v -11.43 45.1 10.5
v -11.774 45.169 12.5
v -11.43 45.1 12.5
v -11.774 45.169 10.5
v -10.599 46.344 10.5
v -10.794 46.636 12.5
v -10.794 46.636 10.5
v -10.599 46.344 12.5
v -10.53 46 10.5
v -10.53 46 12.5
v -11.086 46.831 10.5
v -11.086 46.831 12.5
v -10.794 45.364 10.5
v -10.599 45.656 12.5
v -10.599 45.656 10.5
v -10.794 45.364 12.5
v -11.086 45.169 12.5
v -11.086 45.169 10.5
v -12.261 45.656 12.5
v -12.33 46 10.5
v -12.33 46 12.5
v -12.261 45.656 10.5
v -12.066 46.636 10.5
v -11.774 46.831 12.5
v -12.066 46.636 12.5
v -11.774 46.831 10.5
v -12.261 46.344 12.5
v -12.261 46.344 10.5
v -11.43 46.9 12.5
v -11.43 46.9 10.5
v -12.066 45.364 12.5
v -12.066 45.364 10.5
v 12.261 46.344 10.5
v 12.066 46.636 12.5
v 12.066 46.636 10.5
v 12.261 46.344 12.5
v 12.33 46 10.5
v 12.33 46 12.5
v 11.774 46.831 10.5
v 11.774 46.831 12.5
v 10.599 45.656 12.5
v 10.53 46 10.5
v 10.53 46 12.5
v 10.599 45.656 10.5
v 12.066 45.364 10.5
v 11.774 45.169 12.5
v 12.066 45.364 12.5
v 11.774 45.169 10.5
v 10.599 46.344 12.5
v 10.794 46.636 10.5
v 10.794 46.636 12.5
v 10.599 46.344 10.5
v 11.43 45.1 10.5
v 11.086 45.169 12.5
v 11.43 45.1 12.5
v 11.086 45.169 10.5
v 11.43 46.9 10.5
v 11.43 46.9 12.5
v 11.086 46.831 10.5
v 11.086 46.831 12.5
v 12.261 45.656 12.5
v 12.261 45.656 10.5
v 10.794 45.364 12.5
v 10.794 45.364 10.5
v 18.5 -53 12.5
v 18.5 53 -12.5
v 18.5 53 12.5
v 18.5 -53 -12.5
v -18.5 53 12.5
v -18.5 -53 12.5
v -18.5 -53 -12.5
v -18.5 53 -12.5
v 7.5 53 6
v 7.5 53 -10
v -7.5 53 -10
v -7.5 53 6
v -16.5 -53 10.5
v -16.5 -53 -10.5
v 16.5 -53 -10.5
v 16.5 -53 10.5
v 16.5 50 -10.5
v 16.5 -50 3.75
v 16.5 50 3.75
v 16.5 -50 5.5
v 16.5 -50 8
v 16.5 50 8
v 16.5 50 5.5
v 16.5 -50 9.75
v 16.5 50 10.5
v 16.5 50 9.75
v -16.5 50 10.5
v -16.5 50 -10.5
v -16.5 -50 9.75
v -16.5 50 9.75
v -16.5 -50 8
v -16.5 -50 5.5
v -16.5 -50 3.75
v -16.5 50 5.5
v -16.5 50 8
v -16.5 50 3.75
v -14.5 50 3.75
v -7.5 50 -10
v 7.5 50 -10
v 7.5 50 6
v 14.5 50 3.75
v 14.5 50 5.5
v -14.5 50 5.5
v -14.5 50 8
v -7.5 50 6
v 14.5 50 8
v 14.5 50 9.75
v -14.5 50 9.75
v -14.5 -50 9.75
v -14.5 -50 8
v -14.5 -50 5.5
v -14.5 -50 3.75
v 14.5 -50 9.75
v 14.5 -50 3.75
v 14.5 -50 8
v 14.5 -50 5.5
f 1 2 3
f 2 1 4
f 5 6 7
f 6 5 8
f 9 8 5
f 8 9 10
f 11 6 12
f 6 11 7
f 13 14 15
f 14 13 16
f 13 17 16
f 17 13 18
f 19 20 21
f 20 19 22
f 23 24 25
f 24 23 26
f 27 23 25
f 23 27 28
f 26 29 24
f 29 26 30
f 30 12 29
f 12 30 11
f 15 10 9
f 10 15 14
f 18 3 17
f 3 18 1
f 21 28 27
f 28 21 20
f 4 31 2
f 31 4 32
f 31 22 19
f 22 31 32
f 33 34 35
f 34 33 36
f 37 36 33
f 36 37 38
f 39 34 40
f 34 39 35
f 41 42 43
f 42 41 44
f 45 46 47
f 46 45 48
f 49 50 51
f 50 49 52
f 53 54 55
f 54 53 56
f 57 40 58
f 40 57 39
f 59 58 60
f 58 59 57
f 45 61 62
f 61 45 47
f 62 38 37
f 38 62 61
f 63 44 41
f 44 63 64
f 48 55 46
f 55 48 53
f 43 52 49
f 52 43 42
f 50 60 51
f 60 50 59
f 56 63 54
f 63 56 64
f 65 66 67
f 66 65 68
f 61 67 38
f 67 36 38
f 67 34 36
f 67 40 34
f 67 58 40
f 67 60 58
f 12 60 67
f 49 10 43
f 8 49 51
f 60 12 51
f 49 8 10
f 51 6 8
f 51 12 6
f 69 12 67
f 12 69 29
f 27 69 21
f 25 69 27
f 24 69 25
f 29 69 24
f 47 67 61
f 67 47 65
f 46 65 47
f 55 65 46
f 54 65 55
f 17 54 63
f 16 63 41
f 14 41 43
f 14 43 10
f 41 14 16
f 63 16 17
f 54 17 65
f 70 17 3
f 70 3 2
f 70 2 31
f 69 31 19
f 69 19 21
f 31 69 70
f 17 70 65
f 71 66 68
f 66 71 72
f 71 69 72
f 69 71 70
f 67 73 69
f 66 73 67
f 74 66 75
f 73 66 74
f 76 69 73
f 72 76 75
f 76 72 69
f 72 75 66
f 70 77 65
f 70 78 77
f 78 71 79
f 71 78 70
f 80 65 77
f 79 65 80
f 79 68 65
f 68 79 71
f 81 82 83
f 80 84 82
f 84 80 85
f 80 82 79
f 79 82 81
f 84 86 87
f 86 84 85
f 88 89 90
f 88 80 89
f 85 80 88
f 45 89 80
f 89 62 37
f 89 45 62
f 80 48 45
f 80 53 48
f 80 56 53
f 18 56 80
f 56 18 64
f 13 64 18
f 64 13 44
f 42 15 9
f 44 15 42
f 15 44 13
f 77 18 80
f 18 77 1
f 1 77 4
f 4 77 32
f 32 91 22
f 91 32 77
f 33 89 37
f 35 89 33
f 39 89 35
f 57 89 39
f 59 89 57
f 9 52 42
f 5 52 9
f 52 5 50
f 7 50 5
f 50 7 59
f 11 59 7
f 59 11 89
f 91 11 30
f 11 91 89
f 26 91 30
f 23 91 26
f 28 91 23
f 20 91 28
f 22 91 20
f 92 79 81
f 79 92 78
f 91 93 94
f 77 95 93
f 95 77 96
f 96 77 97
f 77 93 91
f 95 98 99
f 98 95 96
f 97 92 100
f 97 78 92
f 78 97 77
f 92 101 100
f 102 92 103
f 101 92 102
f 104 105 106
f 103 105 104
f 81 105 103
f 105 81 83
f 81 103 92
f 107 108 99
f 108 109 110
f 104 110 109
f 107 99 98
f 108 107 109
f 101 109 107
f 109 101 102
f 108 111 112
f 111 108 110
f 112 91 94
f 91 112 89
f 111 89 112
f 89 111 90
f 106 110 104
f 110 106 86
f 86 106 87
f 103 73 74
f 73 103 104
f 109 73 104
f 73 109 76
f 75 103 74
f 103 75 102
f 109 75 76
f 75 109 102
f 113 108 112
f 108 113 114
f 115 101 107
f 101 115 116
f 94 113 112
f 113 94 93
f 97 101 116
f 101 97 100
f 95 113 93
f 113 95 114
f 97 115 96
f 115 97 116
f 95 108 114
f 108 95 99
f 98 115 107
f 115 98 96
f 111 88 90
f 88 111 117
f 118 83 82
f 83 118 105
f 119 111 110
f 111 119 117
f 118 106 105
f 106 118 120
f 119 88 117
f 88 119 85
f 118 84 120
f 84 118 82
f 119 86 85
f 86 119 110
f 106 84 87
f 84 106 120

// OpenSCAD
// box to insert pcb and fix with 2 screws

pcb_size = [31.5,100,1.6]; // size of PCB

box_inner = [33,104,21];
thick = 2;

rail_outer = [2,100,6];
rail_inner = [3,101,2.5];

pcb_bottom = 2.5; // space from bottom
usb_pos = 14; // from PCB bottom

module pcb()
{
  translate([0,0,box_inner[2]/2-rail_inner[2]/2-pcb_bottom])
  cube(pcb_size,center=true);
}

module rail()
{
  difference()
  {
    cube(rail_outer,center=true);
    cube(rail_inner,center=true);
  }
}

module rails()
{
  for(i=[-1,1])
    translate([(box_inner[0]/2-rail_outer[0]/2)*i,0,box_inner[2]/2-rail_inner[2]/2-pcb_bottom])
      rail();
}

module usb_connector_cut()
{
  translate([0,-box_inner[1]/2,+box_inner[2]/2-pcb_bottom-usb_pos])
  cube([31,10,6],center=true);
}

module rj12_connector_cut()
{
  translate([0,box_inner[1]/2,+box_inner[2]/2-pcb_bottom-10])
  cube([15,10,16],center=true);
}

module screw_holes()
{
  for(i=[-1,1])
  translate([i*2.54*4.5,box_inner[1]/2-6,box_inner[2]/2])
    cylinder(d=1.8,h=10,$fn=16,center=true);
}

module box()
{
  difference()
  {
    cube(box_inner+[2,1,2]*thick,center=true);
    translate([0,-thick,0])
    cube(box_inner,center=true);
    usb_connector_cut();
    rj12_connector_cut();
    screw_holes();
  }
  rails();
}

box();
%pcb();
